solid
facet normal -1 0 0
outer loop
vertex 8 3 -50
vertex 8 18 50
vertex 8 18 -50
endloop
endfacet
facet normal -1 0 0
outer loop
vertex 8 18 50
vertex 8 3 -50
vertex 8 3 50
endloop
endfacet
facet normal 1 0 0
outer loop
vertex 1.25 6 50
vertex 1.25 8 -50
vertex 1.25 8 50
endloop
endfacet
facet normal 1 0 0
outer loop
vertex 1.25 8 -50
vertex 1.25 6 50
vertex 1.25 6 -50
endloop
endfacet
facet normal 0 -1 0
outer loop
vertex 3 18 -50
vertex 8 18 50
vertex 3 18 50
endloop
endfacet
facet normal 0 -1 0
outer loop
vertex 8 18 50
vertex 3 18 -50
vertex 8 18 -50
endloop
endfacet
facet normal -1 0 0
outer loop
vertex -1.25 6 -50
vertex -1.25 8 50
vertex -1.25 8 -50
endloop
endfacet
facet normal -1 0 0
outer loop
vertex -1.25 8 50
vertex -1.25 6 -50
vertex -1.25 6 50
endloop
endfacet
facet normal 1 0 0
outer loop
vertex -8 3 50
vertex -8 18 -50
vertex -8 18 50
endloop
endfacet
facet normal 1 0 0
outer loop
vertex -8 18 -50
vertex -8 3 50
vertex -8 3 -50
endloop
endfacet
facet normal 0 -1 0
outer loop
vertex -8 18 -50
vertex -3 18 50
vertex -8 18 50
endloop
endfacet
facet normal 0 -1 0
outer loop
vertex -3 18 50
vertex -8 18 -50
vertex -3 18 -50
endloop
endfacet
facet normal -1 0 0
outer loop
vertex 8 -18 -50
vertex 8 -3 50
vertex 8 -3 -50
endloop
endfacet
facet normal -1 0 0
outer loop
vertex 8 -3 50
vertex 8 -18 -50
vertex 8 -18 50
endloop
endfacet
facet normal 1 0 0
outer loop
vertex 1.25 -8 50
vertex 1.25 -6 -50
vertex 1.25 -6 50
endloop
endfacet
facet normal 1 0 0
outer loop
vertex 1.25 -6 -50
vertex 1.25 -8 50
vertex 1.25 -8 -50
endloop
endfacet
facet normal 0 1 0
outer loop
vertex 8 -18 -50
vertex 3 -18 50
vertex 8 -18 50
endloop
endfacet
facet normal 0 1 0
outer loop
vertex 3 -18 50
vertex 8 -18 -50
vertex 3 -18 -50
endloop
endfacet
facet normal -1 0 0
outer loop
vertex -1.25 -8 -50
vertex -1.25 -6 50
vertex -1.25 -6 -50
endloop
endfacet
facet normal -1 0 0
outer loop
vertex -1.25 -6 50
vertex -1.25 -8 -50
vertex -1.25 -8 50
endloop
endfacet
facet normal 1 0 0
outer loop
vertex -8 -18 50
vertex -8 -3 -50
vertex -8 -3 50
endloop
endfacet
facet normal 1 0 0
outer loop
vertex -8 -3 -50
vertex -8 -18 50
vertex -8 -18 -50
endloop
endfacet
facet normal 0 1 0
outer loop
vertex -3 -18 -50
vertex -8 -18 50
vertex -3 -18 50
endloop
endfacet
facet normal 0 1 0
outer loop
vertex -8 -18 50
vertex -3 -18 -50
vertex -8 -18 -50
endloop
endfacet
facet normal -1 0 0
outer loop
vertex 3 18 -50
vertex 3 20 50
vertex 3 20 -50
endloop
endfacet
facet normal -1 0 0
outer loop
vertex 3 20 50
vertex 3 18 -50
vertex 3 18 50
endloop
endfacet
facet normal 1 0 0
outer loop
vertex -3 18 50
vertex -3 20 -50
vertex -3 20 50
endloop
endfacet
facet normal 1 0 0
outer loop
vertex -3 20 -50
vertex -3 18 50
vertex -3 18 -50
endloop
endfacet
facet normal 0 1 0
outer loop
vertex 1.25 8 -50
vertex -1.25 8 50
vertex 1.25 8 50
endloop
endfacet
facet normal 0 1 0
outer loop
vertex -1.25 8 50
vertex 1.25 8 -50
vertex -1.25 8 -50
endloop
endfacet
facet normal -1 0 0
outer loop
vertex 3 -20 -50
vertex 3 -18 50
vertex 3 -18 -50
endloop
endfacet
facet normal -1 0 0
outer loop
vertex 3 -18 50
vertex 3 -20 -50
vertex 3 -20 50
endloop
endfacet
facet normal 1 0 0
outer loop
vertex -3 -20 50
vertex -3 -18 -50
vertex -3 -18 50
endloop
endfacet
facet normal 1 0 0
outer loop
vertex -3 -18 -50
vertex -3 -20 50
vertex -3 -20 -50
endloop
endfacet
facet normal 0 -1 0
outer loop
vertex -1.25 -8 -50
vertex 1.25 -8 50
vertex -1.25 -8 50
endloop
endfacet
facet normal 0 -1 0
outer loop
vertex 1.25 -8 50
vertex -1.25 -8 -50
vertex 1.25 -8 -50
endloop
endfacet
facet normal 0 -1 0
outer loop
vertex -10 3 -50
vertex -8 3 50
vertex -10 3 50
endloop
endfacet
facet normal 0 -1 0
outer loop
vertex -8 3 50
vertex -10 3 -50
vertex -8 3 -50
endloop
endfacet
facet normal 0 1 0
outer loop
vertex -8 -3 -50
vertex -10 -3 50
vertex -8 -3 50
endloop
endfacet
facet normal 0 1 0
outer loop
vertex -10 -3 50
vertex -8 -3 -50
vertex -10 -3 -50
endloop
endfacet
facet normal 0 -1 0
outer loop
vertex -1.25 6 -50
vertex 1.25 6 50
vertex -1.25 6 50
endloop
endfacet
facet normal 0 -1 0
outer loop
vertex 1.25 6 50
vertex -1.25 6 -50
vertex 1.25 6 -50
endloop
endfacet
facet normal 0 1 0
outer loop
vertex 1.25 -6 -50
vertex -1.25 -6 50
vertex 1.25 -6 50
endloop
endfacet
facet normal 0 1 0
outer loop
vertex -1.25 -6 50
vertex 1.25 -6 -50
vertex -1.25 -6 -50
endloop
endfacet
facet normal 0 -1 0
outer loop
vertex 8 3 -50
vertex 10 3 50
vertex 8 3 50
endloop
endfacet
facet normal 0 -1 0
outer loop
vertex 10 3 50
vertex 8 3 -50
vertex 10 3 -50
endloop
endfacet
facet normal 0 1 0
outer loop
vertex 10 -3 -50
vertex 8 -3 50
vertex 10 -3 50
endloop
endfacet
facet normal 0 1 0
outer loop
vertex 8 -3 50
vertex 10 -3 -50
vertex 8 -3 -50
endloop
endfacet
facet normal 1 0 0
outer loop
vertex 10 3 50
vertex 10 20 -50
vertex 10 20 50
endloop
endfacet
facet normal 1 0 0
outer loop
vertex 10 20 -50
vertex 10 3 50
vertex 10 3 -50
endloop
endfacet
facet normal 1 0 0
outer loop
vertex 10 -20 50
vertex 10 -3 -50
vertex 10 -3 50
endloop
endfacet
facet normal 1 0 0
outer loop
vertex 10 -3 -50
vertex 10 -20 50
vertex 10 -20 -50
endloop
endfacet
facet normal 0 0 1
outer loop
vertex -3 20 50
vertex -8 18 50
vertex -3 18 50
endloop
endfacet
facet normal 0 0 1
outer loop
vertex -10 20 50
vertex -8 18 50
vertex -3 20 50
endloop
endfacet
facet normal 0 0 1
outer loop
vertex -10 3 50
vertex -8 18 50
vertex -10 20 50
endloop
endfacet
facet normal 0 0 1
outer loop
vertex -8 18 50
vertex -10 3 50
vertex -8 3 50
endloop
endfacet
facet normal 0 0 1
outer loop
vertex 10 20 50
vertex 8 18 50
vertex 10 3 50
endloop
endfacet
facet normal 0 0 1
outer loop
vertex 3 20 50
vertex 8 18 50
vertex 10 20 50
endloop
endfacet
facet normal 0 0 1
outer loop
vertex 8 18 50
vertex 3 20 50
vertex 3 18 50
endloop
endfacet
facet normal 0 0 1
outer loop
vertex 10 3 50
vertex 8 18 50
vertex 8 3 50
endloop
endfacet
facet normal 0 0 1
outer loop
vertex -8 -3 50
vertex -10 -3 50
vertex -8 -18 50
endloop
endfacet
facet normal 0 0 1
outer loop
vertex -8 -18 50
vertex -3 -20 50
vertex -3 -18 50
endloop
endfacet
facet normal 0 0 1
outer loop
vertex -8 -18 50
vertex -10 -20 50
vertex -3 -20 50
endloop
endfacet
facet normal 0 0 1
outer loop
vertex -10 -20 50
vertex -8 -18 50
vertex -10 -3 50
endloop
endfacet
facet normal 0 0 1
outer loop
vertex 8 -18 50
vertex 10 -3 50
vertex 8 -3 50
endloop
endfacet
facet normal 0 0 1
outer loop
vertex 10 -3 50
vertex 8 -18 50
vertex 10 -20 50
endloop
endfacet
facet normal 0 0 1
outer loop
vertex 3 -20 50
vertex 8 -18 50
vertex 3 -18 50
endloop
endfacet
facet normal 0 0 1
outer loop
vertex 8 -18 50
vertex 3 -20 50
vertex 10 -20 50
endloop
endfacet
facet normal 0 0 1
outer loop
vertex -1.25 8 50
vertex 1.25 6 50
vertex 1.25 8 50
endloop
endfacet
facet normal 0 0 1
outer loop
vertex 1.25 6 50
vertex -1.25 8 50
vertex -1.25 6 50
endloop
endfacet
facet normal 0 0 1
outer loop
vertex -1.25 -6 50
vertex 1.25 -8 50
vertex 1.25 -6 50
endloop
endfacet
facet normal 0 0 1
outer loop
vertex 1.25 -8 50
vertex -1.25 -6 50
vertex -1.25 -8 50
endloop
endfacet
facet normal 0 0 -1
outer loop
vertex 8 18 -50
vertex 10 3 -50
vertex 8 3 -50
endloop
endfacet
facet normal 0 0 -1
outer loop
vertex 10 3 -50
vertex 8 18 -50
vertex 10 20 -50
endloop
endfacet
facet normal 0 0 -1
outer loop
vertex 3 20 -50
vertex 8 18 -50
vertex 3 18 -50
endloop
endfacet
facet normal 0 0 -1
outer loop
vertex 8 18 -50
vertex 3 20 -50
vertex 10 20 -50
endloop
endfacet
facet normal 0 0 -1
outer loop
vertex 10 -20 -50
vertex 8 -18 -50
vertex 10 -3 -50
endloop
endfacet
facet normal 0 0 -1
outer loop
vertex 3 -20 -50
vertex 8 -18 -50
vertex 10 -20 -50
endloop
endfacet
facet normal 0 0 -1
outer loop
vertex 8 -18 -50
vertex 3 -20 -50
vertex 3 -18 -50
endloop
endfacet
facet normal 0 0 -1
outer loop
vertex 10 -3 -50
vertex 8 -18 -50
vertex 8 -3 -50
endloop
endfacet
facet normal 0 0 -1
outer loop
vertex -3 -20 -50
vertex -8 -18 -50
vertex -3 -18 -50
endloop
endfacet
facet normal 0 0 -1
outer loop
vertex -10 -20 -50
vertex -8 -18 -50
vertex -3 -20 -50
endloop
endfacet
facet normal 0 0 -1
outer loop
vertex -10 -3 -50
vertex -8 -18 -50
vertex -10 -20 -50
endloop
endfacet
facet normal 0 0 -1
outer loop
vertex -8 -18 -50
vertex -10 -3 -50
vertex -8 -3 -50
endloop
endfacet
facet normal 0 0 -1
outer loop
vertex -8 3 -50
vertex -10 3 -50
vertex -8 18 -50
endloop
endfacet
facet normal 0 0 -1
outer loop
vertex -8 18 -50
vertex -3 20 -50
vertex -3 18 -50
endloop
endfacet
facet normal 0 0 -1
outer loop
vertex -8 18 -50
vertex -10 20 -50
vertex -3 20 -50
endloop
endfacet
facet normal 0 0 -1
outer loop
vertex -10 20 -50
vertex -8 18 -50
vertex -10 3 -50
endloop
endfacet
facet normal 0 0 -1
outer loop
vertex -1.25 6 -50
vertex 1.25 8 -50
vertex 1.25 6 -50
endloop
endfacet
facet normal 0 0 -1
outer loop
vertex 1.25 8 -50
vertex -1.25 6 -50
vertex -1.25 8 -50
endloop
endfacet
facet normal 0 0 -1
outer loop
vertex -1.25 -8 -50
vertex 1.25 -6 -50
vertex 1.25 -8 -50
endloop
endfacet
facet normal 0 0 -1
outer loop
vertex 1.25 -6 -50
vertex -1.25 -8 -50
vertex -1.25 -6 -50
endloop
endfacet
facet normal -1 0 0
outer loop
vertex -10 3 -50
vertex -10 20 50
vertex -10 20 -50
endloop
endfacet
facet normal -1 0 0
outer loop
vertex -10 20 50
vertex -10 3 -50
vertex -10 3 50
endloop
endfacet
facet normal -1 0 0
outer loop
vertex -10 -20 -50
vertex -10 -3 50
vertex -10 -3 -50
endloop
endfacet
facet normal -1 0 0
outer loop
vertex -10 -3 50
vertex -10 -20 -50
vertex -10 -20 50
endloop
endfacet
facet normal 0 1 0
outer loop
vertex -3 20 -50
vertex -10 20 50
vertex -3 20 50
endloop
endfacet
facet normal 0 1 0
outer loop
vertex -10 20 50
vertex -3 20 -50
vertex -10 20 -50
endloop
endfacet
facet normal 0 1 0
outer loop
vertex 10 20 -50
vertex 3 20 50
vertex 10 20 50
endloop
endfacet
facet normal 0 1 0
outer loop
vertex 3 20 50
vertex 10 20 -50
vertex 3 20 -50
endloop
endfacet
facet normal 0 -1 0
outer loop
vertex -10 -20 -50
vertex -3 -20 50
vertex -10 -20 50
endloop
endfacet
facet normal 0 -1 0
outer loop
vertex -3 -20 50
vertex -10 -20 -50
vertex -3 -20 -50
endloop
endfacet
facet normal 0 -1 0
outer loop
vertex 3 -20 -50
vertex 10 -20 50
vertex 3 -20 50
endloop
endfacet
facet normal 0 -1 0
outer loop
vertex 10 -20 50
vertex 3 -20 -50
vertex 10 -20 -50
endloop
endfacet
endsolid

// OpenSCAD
// 20x40 T-slot aluminium extrusion (simplified), 100mm long
// FIX: Ensure a single connected 20x40 body with recognizable extrusion silhouette.
// The previous "internal_void_keep_webs()" removed a full-height and full-width cross,
// splitting the solid into two separate long bars. This version keeps a central web
// by subtracting four quadrant pockets instead of two full-span voids.

$fn = 96;

// Parameters (mm)
profile_W = 20.0;
profile_H = 40.0;
length_L  = 100.0;

// Geometry (simplified but robust)
wall_t         = 2.0;   // outer wall thickness
slot_depth_d   = 6.0;   // depth from outer face to inner cavity
slot_opening_w = 6.0;   // mouth opening width
slot_cavity_w  = 12.0;  // internal cavity width
slot_cavity_h  = 6.0;   // cavity height (inward thickness)
center_bore_d  = 5.0;   // center bore diameter

eps = 0.25;             // overlap for booleans

module outer_solid() {
    cube([profile_W, profile_H, length_L], center=true);
}

module center_bore() {
    cylinder(h=length_L + 2*eps, r=center_bore_d/2, center=true);
}

// T-slot cut on a given face, oriented along Z (extrusion length)
module tslot_on_face(face="top") {
    if (face == "top") {
        translate([0, profile_H/2 - slot_depth_d/2 + eps, 0])
            cube([slot_opening_w, slot_depth_d + 2*eps, length_L + 2*eps], center=true);

        translate([0, profile_H/2 - slot_depth_d - slot_cavity_h/2 + eps, 0])
            cube([slot_cavity_w, slot_cavity_h + 2*eps, length_L + 2*eps], center=true);
    }
    else if (face == "bottom") {
        translate([0, -profile_H/2 + slot_depth_d/2 - eps, 0])
            cube([slot_opening_w, slot_depth_d + 2*eps, length_L + 2*eps], center=true);

        translate([0, -profile_H/2 + slot_depth_d + slot_cavity_h/2 - eps, 0])
            cube([slot_cavity_w, slot_cavity_h + 2*eps, length_L + 2*eps], center=true);
    }
    else if (face == "left") {
        translate([-profile_W/2 + slot_depth_d/2 - eps, 0, 0])
            cube([slot_depth_d + 2*eps, slot_opening_w, length_L + 2*eps], center=true);

        translate([-profile_W/2 + slot_depth_d + slot_cavity_h/2 - eps, 0, 0])
            cube([slot_cavity_h + 2*eps, slot_cavity_w, length_L + 2*eps], center=true);
    }
    else if (face == "right") {
        translate([profile_W/2 - slot_depth_d/2 + eps, 0, 0])
            cube([slot_depth_d + 2*eps, slot_opening_w, length_L + 2*eps], center=true);

        translate([profile_W/2 - slot_depth_d - slot_cavity_h/2 + eps, 0, 0])
            cube([slot_cavity_h + 2*eps, slot_cavity_w, length_L + 2*eps], center=true);
    }
}

// Internal void: remove four quadrant pockets, leaving a central "+" web so the profile stays one piece
module internal_void_keep_webs() {
    web_t = 2.5; // guaranteed connecting web thickness (both X and Y)

    inner_W = profile_W - 2*wall_t;
    inner_H = profile_H - 2*wall_t;

    // Quadrant pocket sizes (each pocket stays within the inner boundary)
    pocket_W = max(0.1, (inner_W - web_t)/2);
    pocket_H = max(0.1, (inner_H - web_t)/2);

    // Pocket centers: offset from origin so pockets do NOT cross the central web
    cx = web_t/2 + pocket_W/2;
    cy = web_t/2 + pocket_H/2;

    union() {
        // Four pockets (NE, NW, SE, SW)
        translate([+cx, +cy, 0]) cube([pocket_W, pocket_H, length_L + 2*eps], center=true);
        translate([-cx, +cy, 0]) cube([pocket_W, pocket_H, length_L + 2*eps], center=true);
        translate([+cx, -cy, 0]) cube([pocket_W, pocket_H, length_L + 2*eps], center=true);
        translate([-cx, -cy, 0]) cube([pocket_W, pocket_H, length_L + 2*eps], center=true);
    }
}

module all_cuts() {
    union() {
        center_bore();
        internal_void_keep_webs();

        // T-slots on all 4 faces
        tslot_on_face("top");
        tslot_on_face("bottom");
        tslot_on_face("left");
        tslot_on_face("right");
    }
}

// Final model: single continuous 20x40 extrusion, 100mm long
difference() {
    outer_solid();
    all_cuts();
}
